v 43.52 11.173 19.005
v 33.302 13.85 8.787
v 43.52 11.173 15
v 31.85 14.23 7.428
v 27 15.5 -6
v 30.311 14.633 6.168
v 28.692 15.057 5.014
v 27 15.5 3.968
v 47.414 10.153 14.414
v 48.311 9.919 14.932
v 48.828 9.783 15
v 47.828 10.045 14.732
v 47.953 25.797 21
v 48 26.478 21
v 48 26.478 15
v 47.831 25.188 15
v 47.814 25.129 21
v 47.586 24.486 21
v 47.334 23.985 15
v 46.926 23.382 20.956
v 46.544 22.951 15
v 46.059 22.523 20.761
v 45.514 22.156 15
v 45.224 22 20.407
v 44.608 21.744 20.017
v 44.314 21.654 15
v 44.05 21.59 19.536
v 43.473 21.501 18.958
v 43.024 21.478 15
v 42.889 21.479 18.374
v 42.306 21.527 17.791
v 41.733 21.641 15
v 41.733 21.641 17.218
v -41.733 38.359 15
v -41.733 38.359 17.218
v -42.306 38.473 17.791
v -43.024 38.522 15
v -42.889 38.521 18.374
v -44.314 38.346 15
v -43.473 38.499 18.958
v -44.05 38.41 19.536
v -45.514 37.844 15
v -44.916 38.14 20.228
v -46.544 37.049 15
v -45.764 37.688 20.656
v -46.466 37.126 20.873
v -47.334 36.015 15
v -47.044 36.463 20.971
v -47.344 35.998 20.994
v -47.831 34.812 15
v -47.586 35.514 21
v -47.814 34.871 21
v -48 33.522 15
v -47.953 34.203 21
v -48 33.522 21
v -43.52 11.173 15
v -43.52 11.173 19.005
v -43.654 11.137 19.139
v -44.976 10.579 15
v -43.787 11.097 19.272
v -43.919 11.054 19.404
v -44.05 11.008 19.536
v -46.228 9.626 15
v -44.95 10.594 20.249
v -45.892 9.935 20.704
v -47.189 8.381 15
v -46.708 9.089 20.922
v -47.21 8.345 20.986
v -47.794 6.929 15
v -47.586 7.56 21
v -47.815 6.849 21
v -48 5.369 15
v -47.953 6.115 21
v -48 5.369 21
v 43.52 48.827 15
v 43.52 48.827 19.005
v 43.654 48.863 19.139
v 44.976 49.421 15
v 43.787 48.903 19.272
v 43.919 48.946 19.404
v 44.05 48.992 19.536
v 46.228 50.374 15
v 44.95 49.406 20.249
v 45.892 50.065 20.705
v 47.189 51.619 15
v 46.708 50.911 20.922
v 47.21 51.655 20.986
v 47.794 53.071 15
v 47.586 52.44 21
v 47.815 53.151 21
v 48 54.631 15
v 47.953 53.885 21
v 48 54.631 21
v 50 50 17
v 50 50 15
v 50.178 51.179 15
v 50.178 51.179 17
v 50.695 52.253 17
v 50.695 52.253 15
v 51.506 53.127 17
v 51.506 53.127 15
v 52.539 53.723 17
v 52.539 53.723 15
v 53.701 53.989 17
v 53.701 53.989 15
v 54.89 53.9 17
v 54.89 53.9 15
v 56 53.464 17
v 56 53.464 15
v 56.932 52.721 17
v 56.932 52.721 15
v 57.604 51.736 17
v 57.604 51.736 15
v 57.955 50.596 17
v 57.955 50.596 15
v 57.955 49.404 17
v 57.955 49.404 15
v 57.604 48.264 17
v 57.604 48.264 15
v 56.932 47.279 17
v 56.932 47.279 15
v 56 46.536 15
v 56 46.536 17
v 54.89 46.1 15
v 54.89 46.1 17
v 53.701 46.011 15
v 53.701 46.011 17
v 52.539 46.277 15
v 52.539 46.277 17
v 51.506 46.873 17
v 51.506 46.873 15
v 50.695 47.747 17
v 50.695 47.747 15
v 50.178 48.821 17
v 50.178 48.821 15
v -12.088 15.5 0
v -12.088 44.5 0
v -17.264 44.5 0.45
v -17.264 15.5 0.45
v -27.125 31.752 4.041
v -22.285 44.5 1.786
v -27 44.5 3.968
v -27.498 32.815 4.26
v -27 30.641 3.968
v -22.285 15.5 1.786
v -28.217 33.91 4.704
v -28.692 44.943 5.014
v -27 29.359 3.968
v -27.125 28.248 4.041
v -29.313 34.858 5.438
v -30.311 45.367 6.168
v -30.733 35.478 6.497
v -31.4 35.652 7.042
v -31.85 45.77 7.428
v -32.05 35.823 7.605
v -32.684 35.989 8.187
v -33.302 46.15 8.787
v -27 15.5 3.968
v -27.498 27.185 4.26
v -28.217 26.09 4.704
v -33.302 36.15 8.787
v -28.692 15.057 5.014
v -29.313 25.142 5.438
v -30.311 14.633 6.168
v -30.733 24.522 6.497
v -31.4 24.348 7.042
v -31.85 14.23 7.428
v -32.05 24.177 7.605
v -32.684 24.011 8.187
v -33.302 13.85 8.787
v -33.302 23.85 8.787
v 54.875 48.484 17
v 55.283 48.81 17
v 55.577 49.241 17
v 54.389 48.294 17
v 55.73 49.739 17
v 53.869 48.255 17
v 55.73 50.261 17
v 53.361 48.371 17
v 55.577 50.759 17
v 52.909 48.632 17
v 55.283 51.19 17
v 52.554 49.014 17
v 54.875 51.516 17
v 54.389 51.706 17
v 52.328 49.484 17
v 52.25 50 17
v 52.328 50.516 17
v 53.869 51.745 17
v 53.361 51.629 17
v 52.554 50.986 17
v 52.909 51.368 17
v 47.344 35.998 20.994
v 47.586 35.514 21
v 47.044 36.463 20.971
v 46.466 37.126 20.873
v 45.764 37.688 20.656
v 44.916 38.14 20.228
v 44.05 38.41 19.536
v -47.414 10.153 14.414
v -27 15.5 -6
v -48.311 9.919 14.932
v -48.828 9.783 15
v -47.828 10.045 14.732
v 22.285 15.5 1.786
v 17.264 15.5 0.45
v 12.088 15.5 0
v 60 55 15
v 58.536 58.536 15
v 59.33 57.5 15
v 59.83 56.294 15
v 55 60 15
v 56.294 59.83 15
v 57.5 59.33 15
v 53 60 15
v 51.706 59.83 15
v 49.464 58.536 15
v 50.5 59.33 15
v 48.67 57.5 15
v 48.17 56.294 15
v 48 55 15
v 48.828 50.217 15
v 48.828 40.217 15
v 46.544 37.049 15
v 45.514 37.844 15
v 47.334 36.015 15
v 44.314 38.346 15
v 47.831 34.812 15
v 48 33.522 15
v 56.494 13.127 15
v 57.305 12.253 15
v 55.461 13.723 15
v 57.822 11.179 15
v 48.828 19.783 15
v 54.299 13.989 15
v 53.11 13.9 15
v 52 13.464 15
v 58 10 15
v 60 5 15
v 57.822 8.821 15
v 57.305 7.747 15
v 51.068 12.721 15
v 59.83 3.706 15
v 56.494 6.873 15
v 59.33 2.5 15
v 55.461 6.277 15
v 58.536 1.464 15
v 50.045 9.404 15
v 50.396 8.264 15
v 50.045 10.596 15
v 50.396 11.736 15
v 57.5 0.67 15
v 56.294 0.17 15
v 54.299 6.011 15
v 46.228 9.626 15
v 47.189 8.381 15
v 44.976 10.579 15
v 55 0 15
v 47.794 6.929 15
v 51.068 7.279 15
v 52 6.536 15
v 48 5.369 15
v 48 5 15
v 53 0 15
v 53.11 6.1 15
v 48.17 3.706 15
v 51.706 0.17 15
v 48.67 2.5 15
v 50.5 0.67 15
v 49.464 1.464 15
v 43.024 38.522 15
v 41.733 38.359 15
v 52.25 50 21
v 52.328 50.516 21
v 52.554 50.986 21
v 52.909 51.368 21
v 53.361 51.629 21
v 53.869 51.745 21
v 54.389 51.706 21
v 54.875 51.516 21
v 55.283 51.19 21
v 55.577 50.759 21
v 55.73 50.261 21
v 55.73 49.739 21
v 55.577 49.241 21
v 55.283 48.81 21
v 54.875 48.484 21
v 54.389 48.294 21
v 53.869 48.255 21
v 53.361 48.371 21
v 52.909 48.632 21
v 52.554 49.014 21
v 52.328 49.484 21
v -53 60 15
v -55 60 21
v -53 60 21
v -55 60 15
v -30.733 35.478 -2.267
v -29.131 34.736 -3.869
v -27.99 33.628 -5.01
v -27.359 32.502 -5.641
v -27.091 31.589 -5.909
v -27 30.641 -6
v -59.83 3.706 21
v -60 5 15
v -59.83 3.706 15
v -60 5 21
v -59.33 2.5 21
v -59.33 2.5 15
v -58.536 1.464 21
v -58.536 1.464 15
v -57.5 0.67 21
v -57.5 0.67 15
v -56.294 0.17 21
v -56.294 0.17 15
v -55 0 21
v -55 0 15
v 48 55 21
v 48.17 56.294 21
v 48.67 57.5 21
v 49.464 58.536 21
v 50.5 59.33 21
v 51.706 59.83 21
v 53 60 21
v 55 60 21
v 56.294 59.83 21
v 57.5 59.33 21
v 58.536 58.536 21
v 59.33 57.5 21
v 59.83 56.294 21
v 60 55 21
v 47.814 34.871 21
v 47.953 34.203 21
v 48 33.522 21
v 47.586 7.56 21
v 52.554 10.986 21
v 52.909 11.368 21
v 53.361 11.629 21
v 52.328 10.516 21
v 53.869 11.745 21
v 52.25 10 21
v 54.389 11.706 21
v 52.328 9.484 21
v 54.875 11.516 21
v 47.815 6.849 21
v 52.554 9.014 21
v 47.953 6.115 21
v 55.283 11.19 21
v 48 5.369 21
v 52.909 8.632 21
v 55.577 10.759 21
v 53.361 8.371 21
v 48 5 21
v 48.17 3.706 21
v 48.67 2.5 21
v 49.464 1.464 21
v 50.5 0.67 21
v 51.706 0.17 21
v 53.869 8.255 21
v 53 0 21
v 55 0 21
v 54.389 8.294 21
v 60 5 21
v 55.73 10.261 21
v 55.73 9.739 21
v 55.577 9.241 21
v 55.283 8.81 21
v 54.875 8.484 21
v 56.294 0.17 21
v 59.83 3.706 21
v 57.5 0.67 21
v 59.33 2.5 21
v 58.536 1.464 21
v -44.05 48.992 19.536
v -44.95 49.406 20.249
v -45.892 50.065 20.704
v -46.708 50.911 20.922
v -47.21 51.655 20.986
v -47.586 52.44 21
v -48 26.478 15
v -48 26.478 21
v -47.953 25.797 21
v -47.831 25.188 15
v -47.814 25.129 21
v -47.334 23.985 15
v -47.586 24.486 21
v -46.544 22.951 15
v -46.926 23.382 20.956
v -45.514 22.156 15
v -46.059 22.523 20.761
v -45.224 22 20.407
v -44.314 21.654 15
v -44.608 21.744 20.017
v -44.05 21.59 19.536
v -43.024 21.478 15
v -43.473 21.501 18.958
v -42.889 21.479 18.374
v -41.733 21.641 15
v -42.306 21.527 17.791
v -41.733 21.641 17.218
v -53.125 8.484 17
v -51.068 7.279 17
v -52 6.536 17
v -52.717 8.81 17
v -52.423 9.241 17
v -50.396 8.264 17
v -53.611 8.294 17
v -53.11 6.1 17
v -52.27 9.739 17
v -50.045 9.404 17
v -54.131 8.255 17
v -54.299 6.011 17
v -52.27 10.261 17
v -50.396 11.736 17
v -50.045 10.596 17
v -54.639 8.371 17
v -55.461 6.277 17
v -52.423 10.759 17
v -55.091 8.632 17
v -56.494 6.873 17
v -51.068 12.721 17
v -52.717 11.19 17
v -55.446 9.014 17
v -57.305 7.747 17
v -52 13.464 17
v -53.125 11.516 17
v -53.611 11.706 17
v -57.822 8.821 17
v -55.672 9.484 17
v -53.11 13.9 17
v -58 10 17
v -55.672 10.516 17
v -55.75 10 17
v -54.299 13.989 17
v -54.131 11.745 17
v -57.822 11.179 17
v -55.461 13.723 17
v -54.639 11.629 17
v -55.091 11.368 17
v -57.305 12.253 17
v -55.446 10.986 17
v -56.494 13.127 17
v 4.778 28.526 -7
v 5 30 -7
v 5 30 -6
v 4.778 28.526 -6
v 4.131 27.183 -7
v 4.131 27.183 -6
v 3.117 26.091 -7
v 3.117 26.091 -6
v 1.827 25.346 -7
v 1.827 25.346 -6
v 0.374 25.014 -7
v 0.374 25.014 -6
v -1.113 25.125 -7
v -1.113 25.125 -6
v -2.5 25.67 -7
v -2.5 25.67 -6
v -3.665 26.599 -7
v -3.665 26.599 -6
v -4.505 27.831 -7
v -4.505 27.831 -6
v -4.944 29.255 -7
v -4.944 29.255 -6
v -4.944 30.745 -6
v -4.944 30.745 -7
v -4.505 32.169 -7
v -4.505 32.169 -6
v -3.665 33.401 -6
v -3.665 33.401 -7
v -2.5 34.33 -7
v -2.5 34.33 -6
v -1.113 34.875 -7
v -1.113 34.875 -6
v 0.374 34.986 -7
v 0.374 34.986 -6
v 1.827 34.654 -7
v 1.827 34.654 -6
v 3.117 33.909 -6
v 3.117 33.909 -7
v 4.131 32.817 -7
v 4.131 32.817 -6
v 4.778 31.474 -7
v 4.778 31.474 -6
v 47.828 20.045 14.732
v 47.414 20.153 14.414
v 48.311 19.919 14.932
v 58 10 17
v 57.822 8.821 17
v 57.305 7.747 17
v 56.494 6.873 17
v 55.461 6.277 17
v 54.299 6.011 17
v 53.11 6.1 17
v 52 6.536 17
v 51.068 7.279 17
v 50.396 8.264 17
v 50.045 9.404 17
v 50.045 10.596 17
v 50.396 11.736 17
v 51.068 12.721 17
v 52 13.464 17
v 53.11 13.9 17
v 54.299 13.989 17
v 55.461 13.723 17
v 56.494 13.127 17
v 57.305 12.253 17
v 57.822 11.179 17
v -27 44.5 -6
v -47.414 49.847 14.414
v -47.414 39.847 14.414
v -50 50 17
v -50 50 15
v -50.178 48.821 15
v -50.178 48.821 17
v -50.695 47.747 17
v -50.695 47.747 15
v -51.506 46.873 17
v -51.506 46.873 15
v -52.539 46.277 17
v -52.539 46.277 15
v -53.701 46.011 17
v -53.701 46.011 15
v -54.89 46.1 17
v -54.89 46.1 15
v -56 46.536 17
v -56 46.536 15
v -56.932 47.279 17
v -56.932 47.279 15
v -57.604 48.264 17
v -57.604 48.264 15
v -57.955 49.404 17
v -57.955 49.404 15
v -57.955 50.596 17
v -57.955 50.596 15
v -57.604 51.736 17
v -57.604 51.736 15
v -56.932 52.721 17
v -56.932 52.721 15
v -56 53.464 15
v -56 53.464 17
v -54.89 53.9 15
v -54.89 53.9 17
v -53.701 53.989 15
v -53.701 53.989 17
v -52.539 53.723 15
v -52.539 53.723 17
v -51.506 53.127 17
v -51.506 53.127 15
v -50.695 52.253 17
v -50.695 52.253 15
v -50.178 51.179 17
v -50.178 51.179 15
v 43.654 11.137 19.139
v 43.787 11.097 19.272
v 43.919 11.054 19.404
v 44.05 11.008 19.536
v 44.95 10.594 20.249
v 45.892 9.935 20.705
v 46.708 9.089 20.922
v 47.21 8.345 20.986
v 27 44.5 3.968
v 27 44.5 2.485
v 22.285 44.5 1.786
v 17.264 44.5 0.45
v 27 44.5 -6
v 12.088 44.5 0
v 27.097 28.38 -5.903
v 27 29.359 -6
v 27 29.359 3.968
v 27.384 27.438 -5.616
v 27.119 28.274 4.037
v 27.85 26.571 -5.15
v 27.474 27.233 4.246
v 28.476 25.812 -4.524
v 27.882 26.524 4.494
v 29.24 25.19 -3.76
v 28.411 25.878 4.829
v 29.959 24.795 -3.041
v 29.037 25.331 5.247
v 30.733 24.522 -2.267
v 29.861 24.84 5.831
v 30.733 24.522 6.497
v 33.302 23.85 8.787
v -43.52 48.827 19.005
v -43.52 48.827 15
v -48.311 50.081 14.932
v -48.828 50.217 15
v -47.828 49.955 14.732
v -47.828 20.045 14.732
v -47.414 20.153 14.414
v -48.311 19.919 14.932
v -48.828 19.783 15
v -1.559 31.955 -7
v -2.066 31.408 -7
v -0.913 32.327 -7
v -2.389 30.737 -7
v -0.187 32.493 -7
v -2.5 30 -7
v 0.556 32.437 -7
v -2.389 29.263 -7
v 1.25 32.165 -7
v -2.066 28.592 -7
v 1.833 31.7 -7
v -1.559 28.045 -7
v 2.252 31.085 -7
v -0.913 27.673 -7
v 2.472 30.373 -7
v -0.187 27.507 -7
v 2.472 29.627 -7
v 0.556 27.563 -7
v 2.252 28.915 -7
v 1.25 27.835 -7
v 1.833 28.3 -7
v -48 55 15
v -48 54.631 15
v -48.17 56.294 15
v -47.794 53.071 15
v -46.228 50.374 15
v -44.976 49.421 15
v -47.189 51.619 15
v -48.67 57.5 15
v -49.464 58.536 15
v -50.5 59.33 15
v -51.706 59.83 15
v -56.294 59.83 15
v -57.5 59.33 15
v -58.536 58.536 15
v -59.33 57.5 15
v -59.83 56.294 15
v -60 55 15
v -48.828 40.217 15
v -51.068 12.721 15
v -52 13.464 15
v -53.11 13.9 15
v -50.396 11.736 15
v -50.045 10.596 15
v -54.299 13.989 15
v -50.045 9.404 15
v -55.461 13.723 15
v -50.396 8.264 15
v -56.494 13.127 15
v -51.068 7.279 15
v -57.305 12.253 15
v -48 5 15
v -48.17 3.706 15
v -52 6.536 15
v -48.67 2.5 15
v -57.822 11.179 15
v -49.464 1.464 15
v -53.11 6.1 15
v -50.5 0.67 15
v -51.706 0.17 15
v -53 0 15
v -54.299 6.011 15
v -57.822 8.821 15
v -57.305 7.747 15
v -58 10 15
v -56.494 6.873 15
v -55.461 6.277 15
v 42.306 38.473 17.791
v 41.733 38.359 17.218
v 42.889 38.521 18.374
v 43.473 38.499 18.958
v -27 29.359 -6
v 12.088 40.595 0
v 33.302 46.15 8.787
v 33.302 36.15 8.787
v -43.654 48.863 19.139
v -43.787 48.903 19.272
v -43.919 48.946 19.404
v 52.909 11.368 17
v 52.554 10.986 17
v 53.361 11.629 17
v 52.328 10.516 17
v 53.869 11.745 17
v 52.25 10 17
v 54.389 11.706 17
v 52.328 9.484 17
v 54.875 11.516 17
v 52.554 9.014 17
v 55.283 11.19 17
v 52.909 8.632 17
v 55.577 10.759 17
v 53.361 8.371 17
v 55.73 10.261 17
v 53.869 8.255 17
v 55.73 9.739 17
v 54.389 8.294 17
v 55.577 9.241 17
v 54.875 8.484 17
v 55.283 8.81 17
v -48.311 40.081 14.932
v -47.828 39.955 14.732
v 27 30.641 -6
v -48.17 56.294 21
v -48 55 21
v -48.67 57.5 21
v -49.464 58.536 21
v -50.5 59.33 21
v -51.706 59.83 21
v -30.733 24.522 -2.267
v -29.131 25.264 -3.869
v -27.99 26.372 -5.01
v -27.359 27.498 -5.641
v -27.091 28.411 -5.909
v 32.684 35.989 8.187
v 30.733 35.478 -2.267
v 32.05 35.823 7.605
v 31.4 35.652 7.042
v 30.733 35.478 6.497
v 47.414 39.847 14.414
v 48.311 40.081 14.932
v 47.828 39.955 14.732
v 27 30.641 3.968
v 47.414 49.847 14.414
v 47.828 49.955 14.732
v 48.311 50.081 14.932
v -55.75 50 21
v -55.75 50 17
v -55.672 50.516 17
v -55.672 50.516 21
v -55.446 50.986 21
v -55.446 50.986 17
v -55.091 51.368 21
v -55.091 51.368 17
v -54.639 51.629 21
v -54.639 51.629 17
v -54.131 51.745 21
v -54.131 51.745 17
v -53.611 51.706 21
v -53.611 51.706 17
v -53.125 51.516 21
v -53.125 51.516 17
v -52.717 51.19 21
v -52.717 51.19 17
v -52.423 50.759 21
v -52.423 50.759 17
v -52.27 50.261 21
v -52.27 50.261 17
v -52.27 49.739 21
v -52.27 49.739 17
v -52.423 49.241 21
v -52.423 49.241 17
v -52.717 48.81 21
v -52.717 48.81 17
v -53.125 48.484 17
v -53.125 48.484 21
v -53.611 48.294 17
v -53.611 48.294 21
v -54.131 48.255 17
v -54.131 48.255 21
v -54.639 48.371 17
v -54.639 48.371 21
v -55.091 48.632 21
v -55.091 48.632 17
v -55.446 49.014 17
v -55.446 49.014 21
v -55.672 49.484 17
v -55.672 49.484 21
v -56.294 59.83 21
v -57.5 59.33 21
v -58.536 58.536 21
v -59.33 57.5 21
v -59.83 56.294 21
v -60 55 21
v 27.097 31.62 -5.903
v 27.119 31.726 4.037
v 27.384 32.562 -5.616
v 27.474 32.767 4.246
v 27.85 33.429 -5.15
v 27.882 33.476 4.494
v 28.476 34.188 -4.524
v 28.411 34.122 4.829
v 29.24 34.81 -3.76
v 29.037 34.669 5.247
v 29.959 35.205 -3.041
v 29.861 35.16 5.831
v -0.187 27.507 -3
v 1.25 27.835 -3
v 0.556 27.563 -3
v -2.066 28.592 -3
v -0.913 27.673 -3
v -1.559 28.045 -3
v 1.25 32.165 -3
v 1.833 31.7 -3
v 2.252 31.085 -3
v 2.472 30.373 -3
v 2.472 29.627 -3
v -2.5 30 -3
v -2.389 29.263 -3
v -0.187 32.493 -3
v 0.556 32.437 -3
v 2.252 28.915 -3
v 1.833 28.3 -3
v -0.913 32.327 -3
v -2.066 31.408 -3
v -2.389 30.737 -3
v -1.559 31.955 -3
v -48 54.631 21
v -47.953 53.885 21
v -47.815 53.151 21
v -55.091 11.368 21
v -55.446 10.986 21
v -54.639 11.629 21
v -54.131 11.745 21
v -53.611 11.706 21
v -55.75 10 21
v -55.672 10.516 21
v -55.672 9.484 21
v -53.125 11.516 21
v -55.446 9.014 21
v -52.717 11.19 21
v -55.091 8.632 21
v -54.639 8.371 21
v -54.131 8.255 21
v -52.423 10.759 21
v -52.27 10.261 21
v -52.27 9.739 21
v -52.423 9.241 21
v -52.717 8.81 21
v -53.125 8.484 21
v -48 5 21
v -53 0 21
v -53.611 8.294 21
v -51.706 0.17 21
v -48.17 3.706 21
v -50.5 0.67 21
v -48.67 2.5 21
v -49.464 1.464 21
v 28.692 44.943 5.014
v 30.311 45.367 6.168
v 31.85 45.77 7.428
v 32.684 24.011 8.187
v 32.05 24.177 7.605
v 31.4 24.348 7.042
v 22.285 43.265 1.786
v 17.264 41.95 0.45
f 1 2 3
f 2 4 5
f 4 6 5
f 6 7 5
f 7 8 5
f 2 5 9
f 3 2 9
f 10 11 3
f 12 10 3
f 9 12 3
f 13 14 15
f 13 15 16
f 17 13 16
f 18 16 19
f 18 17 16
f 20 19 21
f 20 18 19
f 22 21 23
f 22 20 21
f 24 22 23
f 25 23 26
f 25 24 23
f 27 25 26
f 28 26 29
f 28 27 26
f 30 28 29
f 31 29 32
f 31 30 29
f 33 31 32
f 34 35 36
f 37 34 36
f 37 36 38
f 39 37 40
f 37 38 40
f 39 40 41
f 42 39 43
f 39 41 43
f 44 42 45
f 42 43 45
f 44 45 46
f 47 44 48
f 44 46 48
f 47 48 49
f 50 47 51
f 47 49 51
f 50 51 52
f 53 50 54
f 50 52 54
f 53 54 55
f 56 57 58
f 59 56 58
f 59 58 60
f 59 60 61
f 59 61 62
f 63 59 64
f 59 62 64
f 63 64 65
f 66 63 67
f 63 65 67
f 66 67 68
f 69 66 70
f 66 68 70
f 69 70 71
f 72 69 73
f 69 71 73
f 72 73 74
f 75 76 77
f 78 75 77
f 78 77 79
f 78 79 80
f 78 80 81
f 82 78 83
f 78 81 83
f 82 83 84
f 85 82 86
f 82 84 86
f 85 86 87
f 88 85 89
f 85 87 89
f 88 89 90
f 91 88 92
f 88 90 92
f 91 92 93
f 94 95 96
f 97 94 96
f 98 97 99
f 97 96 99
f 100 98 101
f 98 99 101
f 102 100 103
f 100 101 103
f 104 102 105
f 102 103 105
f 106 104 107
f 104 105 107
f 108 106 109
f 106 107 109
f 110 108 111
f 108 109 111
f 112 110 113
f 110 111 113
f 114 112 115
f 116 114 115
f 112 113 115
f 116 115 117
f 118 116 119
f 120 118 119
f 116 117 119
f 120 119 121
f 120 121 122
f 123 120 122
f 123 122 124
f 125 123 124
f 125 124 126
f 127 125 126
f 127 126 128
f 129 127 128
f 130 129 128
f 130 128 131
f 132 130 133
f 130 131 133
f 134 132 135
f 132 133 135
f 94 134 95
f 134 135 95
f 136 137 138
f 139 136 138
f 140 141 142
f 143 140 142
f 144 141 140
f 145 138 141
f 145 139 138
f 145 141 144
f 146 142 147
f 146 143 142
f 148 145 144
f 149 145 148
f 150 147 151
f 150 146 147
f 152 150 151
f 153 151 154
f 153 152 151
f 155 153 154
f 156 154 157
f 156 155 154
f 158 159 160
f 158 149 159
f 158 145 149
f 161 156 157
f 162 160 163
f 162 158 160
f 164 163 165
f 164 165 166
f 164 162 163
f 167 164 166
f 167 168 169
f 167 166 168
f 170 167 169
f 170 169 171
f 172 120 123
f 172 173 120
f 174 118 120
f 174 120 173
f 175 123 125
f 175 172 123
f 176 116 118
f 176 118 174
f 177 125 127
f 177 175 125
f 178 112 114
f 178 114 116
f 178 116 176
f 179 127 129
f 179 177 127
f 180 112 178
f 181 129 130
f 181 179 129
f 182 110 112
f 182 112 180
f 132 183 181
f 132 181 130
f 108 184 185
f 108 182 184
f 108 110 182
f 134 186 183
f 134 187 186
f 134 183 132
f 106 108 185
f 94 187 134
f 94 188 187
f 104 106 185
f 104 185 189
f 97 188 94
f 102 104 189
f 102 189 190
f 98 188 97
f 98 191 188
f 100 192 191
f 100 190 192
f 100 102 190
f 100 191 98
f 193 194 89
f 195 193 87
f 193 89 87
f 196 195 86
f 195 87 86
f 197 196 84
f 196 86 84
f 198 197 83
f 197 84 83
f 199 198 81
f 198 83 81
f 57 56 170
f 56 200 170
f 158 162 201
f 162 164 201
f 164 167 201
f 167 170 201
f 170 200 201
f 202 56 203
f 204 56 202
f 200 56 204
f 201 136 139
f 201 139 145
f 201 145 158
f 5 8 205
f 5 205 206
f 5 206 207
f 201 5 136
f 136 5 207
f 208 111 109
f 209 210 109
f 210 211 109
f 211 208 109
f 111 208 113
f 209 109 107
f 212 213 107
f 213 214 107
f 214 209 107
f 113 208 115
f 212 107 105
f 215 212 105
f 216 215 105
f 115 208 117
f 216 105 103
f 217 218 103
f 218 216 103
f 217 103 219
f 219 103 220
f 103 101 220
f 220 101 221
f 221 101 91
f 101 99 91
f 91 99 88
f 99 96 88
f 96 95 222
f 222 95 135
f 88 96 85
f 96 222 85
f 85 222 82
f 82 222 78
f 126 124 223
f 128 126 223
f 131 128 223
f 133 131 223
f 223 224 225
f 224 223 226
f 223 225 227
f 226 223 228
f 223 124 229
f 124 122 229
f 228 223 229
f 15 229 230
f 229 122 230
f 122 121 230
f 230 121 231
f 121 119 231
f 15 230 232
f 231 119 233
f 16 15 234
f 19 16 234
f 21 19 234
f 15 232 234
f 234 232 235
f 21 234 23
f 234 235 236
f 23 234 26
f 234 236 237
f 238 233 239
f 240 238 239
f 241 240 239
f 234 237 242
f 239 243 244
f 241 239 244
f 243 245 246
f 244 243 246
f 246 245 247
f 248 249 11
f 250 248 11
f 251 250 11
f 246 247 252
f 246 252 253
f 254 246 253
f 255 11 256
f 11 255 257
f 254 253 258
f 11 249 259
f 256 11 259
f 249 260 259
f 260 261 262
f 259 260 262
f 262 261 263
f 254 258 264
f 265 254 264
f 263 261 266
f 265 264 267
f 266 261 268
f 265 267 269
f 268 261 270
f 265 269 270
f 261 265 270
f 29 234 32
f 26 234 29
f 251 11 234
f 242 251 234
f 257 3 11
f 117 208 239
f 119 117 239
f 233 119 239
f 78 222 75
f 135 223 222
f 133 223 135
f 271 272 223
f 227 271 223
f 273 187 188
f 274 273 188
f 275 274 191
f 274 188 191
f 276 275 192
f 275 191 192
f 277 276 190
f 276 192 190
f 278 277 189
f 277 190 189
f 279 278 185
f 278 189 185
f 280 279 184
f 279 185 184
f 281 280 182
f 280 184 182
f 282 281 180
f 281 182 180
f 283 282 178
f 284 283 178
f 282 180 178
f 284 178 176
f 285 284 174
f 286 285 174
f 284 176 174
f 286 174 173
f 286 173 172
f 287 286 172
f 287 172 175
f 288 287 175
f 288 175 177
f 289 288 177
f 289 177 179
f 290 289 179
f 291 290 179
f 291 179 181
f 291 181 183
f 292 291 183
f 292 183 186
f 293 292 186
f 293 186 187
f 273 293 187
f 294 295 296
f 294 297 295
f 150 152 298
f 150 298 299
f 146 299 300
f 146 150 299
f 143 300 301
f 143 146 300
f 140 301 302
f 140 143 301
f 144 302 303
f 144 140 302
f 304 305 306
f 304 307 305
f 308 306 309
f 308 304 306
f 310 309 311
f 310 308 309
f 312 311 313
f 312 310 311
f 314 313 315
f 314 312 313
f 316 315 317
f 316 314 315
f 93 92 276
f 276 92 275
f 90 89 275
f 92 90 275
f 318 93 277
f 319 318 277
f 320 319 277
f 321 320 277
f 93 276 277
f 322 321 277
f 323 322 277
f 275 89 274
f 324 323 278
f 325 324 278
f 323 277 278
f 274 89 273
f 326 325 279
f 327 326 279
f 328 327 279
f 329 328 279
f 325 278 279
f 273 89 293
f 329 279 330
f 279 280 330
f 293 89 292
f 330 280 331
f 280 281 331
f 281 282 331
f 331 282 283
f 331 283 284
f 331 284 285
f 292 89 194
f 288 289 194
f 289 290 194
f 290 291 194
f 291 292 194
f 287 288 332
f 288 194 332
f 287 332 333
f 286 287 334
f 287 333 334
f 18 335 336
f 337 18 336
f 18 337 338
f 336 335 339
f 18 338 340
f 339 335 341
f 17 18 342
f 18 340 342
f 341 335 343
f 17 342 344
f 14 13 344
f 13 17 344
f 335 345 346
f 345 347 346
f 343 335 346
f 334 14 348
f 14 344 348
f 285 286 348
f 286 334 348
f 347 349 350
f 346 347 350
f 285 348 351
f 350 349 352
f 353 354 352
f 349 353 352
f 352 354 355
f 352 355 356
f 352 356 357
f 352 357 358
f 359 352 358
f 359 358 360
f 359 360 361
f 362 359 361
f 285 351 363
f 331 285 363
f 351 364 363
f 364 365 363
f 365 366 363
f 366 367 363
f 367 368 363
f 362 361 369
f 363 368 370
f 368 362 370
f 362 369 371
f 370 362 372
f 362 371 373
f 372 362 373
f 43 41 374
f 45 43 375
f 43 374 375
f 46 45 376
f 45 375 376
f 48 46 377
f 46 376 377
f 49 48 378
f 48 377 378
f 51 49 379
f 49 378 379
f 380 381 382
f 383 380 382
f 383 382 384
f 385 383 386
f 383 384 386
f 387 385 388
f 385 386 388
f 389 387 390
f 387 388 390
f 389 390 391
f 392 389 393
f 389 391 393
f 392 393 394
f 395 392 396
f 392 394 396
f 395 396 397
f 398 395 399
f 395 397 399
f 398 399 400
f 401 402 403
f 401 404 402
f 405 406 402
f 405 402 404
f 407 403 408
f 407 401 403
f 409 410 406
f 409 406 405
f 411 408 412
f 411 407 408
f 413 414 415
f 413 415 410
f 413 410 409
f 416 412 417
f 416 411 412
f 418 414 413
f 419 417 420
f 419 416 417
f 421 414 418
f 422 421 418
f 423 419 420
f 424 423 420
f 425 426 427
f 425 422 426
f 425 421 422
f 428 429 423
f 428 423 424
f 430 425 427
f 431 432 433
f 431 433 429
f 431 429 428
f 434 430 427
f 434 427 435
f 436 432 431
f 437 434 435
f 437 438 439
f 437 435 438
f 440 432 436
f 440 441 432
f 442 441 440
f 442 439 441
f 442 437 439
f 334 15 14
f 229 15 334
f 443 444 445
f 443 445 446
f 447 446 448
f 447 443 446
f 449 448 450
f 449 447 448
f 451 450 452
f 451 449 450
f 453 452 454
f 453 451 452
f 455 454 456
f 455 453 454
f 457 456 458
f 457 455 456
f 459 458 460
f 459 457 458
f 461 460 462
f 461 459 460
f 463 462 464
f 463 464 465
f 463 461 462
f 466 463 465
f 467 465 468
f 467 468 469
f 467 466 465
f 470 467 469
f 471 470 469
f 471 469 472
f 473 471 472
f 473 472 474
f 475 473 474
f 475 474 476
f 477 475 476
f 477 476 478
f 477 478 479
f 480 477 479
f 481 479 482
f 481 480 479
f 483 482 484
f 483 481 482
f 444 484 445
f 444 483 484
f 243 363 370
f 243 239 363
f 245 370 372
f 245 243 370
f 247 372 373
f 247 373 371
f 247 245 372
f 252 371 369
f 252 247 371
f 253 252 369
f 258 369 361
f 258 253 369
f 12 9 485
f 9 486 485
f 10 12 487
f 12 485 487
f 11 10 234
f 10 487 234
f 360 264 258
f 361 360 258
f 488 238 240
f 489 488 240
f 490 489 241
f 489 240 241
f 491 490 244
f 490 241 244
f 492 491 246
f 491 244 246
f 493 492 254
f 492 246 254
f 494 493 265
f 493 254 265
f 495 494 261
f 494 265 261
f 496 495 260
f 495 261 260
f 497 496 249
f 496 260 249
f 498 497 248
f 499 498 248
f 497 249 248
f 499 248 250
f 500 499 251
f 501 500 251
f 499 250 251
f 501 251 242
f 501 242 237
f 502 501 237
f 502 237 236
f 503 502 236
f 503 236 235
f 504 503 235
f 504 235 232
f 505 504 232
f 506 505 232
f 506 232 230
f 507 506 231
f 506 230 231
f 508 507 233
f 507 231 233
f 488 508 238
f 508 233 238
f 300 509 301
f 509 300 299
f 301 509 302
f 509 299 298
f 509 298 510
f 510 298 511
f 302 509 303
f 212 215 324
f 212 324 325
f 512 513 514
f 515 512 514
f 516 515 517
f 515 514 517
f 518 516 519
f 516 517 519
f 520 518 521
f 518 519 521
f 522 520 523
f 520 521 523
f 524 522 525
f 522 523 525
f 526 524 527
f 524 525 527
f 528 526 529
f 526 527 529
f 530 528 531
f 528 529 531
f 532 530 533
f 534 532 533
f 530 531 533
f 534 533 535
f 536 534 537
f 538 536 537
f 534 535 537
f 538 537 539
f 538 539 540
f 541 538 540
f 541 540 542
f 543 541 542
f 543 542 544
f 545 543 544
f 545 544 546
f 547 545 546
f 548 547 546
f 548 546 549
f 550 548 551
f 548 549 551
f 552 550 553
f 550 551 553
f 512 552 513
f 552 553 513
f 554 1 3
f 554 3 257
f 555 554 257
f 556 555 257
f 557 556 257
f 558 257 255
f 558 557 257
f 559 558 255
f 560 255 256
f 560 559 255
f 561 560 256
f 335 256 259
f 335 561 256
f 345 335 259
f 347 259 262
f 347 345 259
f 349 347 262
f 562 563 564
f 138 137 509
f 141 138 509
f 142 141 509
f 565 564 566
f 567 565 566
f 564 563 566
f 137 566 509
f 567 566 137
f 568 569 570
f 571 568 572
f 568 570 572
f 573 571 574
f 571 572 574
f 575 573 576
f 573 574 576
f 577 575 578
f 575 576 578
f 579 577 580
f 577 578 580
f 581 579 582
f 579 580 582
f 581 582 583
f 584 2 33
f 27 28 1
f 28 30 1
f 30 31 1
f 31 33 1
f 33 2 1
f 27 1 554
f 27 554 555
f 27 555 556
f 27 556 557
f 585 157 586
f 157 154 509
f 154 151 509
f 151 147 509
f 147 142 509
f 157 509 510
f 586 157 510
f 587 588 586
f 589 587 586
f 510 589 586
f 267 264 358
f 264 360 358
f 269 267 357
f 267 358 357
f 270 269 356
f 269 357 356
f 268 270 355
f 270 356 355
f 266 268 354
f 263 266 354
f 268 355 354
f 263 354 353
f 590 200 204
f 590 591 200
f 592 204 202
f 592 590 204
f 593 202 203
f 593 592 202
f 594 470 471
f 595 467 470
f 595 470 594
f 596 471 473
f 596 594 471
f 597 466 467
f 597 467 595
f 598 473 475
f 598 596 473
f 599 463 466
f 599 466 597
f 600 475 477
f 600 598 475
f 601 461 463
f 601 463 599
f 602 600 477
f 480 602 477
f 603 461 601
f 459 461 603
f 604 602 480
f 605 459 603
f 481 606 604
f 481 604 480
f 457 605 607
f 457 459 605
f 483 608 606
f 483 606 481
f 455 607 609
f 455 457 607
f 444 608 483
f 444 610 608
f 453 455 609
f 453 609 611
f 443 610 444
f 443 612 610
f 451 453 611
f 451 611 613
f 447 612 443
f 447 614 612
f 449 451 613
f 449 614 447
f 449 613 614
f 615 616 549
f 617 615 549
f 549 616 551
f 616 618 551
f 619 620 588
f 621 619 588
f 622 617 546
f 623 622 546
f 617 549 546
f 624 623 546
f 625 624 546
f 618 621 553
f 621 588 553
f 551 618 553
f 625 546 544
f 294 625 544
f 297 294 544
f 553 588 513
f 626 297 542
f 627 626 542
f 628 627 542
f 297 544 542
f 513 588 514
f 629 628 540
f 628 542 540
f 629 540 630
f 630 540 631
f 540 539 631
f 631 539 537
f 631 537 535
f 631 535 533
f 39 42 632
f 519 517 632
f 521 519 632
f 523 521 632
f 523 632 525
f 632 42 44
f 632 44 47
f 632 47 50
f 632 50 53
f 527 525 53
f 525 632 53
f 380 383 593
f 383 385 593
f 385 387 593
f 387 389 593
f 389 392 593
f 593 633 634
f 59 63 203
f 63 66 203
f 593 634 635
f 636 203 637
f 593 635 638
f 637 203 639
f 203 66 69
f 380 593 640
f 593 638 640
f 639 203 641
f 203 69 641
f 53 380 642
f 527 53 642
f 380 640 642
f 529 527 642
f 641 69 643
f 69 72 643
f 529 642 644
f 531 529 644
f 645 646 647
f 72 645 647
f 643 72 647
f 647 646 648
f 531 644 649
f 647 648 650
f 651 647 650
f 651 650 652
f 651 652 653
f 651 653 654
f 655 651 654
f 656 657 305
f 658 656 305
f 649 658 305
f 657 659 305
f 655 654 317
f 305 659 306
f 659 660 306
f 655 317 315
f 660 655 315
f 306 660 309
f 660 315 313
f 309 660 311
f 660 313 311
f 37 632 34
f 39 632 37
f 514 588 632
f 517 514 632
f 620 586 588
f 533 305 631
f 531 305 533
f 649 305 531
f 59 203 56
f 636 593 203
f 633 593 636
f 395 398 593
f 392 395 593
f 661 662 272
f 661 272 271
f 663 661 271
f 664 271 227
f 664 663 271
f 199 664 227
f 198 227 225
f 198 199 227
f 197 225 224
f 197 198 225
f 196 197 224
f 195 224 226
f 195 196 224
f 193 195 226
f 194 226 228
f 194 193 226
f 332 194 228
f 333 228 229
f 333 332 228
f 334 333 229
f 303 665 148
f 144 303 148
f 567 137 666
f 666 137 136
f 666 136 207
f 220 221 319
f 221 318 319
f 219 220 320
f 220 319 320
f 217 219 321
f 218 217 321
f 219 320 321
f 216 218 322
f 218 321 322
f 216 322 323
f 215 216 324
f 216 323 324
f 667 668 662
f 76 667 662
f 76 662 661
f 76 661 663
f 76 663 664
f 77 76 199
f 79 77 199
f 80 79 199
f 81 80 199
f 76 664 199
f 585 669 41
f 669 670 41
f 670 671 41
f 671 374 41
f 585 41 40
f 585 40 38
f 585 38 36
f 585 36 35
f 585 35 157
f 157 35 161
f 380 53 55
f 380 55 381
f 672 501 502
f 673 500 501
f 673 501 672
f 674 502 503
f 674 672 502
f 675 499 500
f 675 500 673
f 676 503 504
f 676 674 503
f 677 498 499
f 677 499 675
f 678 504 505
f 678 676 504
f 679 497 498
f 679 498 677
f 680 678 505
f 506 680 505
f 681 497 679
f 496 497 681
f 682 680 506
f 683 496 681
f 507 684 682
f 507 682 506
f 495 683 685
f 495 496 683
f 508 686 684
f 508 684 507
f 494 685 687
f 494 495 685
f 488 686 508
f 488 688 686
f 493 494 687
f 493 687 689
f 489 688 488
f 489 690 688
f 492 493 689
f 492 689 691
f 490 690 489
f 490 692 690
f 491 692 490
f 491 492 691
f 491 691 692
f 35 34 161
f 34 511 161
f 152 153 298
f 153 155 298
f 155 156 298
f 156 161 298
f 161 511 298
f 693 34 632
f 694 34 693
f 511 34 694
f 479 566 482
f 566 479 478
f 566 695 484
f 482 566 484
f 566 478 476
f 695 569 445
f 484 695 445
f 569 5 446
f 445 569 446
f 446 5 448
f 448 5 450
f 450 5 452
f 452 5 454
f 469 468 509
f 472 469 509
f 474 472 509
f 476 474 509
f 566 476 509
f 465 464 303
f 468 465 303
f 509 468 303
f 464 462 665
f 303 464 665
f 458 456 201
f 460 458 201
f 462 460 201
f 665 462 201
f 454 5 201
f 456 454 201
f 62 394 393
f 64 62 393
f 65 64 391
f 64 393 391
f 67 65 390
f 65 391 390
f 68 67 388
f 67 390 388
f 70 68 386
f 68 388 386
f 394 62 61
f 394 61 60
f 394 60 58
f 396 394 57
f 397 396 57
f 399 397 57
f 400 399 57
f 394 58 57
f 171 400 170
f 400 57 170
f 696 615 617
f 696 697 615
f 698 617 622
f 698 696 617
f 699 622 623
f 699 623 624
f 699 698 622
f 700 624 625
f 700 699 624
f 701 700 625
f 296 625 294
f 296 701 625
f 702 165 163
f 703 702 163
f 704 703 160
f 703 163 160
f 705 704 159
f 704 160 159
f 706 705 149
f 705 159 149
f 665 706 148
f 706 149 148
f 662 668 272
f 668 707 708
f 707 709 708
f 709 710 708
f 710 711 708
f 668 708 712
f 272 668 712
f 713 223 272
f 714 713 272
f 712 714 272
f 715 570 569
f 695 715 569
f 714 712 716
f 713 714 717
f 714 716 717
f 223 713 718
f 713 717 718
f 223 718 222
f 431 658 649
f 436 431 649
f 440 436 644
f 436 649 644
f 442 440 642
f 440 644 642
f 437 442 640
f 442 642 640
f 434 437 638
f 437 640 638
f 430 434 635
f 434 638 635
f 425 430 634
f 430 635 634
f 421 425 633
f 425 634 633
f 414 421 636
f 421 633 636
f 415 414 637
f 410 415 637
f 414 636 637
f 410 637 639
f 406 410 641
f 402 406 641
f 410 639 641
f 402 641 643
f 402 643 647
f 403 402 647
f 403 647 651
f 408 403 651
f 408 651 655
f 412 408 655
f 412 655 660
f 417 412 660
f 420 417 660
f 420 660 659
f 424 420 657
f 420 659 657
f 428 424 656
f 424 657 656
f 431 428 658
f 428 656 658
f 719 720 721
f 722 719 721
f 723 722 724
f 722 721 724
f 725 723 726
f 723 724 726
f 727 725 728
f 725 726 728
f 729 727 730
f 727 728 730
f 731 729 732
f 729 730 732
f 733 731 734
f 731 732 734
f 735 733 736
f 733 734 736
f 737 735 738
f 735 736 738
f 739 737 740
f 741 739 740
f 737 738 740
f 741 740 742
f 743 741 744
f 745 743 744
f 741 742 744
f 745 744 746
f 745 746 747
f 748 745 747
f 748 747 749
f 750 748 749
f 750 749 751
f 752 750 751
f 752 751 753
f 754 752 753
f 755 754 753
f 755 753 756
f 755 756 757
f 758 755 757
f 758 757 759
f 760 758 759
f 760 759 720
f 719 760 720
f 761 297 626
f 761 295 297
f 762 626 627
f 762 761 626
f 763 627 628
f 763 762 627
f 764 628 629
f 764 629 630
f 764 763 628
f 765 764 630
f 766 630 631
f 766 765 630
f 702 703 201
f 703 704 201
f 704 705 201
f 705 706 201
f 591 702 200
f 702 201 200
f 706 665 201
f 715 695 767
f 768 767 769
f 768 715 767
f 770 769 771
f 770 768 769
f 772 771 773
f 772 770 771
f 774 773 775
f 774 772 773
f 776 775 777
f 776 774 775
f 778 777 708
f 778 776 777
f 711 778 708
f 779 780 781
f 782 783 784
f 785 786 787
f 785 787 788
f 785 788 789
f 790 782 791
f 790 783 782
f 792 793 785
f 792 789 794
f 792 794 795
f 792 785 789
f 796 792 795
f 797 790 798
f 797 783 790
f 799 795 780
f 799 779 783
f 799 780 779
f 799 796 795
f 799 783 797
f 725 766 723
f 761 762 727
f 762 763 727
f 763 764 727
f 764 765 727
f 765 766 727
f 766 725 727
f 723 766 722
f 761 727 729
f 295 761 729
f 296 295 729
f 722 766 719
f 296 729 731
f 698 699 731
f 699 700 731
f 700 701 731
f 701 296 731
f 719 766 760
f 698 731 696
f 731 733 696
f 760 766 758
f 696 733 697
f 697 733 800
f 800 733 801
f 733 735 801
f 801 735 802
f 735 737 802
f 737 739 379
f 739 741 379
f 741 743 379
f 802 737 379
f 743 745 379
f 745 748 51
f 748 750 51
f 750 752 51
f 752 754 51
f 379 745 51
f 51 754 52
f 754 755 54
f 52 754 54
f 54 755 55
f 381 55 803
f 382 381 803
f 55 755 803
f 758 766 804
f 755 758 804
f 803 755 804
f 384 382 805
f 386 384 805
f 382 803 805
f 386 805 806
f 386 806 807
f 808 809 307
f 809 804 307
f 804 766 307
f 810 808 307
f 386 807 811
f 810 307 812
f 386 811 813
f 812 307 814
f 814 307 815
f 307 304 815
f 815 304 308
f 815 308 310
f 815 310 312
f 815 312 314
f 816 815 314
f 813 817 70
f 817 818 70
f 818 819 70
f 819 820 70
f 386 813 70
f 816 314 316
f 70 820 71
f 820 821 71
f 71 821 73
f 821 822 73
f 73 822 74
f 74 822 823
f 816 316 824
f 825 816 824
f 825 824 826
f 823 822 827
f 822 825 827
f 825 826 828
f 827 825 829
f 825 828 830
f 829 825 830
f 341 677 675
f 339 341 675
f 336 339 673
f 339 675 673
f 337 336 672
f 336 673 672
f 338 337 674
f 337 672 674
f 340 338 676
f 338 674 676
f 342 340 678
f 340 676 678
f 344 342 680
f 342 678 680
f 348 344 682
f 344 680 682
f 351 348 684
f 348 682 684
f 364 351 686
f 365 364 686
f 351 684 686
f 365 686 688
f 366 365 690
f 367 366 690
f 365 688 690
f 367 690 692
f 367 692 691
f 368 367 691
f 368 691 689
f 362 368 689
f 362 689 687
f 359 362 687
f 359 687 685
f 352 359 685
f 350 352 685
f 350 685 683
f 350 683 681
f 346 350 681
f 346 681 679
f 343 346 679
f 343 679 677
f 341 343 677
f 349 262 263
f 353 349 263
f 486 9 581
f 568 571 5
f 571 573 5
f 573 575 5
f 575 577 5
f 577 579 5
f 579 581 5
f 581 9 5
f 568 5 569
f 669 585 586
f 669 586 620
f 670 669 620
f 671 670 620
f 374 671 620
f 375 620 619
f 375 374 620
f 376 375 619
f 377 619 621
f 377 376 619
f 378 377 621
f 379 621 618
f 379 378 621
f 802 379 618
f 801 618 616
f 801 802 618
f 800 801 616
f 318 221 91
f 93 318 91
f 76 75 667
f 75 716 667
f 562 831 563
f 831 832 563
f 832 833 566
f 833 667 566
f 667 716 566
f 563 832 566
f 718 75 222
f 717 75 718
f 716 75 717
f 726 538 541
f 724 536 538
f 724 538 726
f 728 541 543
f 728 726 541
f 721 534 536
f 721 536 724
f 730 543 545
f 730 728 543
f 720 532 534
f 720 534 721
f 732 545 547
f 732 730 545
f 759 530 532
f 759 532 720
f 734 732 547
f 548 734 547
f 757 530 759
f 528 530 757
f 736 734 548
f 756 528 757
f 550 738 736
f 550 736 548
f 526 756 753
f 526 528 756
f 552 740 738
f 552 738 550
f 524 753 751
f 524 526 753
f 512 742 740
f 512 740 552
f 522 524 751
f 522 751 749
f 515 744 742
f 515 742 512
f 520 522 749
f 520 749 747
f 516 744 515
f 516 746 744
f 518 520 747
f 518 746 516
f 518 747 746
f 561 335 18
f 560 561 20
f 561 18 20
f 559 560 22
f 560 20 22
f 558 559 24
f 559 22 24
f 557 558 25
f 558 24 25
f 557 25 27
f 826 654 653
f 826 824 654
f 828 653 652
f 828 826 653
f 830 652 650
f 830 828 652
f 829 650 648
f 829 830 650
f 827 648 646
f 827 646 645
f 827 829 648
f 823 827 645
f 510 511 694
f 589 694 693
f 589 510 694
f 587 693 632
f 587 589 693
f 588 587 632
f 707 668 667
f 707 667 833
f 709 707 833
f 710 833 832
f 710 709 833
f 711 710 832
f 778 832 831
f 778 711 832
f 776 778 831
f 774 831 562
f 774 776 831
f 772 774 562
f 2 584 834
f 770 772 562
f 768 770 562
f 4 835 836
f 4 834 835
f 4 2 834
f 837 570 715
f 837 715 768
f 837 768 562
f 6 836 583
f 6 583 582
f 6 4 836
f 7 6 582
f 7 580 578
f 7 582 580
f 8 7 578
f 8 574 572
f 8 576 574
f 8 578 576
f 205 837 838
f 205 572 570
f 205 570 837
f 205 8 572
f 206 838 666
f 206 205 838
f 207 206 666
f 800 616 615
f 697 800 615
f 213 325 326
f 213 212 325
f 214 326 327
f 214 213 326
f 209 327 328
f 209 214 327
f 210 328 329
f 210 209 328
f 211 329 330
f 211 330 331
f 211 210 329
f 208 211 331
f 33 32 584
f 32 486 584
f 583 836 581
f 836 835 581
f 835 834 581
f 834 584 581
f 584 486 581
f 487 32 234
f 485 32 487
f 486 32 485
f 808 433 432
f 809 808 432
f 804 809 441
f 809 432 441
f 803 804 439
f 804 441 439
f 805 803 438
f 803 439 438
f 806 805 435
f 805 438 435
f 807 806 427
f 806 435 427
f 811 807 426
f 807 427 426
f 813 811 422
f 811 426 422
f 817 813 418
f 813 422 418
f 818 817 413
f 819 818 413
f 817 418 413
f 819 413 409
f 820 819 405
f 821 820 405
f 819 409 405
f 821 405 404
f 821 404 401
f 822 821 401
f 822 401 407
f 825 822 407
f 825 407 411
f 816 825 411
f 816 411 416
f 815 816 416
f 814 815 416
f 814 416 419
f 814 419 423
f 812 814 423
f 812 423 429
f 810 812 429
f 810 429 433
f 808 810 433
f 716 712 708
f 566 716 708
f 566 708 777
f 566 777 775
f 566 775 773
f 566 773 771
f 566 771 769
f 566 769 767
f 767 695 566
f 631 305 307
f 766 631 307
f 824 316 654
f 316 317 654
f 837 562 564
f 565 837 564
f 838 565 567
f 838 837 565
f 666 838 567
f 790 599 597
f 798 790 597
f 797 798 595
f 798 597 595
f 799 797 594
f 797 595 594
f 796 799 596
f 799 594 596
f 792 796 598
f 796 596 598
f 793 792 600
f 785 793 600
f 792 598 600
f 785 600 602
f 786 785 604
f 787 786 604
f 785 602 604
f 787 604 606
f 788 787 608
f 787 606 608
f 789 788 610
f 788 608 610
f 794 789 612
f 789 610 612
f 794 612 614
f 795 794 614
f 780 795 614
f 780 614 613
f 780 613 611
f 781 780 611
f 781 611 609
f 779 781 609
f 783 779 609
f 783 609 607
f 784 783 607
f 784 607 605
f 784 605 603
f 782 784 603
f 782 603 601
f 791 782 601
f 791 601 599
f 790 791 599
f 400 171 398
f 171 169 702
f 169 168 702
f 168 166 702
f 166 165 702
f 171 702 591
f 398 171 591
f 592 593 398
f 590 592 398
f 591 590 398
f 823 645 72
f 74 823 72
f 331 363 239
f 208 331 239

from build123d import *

# Parameters (mm, degrees)
EXTRUDE_1_DEPTH     = 60
SKETCH_2_R          = 1.75
CUT_EXTRUDE_1_DEPTH = 40
SKETCH_3_R          = 4
CUT_EXTRUDE_2_DEPTH = 2
SKETCH_4_R          = 2.5
CUT_EXTRUDE_3_DEPTH = 3
EXTRUDE_START       = 1
SKETCH_5_R          = 5
SKETCH_5_R_2        = 2.5
EXTRUDE_2_DEPTH     = 1
FILLET_1_R          = 5
FILLET_2_R          = 30
FILLET_4_R          = 2
FILLET_5_R          = 5
FILLET_6_R          = 6
FILLET_7_R          = 5


with BuildPart() as part:
    # 草图1 → 凸台-拉伸1 (new body)
    with BuildSketch(Plane(origin=(0, 0, 0), x_dir=(1, 0, 0), z_dir=(0, 1, 0))):
        Polygon((-24.514718626, 0), (24.514718626, 0), (45.514718626, -21), (60, -21), (60, -15), (48, -15), (27, 6), (-27, 6), (-48, -15), (-60, -15), (-60, -21), (-45.514718626, -21), align=None)
    extrude(amount=EXTRUDE_1_DEPTH)

    # 草图2 → 切除-拉伸1 (cut)
    with BuildSketch(Plane(origin=(0, 0, -6), x_dir=(-1, 0, 0), z_dir=(0, 0, -1))):
        with Locations((-54, 50)):
            Circle(SKETCH_2_R)
        with Locations((-54, 10)):
            Circle(SKETCH_2_R)
        with Locations((54, 10)):
            Circle(SKETCH_2_R)
        with Locations((54, 50)):
            Circle(SKETCH_2_R)
        Polygon((-48, 60), (-48, 50), (-27, 44.5), (27, 44.5), (48, 50), (48, 60), align=None)
        Polygon((48, 0), (48, 10), (27, 15.5), (-27, 15.5), (-48, 10), (-48, 0), align=None)
        Polygon((-48, 40), (-27, 34.5), (-27, 25.5), (-48, 20), align=None)
        Polygon((48, 20), (27, 25.5), (27, 34.5), (48, 40), align=None)
    extrude(amount=-CUT_EXTRUDE_1_DEPTH, mode=Mode.SUBTRACT)

    # 草图3 → 切除-拉伸2 (cut)
    with BuildSketch(Plane(origin=(0, 0, 15), x_dir=(-1, 0, 0), z_dir=(0, 0, -1))):
        with Locations((-54, 50)):
            Circle(SKETCH_3_R)
        with Locations(Location((-54, 10, 0), (0, 0, 180))):
            Circle(SKETCH_3_R)
        with Locations((54, 10)):
            Circle(SKETCH_3_R)
        with Locations(Location((54, 50, 0), (0, 0, 180))):
            Circle(SKETCH_3_R)
    extrude(amount=-CUT_EXTRUDE_2_DEPTH, mode=Mode.SUBTRACT)

    # 草图4 → 切除-拉伸3 (cut)
    with BuildSketch(Plane(origin=(0, 0, -6), x_dir=(-1, 0, 0), z_dir=(0, 0, -1))):
        with Locations((0, 30)):
            Circle(SKETCH_4_R)
    extrude(amount=-CUT_EXTRUDE_3_DEPTH, mode=Mode.SUBTRACT)

    # 草图5 → 凸台-拉伸2 (add)
    with BuildSketch(Plane(origin=(0, 0, -6), x_dir=(-1, 0, 0), z_dir=(0, 0, -1)).offset(EXTRUDE_START)):
        with Locations(Location((0, 30, 0), (0, 0, 180))):
            Circle(SKETCH_5_R)
        with Locations((0, 30)):
            Circle(SKETCH_5_R_2, mode=Mode.SUBTRACT)
    extrude(amount=-EXTRUDE_2_DEPTH)

    # 圆角1
    fillet_1_edges = [part.edges().sort_by_distance(p)[0] for p in [
        (60, 60, 18),
        (-60, 0, 18),
        (60, 0, 18),
        (-48, 0, 18),
        (48, 0, 18),
        (-60, 60, 18),
        (48, 60, 18),
        (-48, 60, 18),
    ]]
    fillet(fillet_1_edges, radius=FILLET_1_R)

    # 圆角2
    # the kernel refuses this fillet: 30 mm, written as the material it adds along each edge
    with BuildSketch(Plane(origin=(-24.514718626, -15.566017178, 0), x_dir=(-0.7071067811865465, 0, 0.7071067811865487), z_dir=(0, 1, 0))) as fillet_2_piece_1_section:
        with BuildLine():
            CenterArc((FILLET_2_R * 0.414213562373, FILLET_2_R), FILLET_2_R, 225, 45)
            Line((-FILLET_2_R * 0.292893218813, FILLET_2_R * 0.292893218813), (0, 0))
            Line((0, 0), (FILLET_2_R * 0.414213562373, 0))
        make_face()
    fillet_2_piece_1 = extrude(amount=91.132034356, mode=Mode.PRIVATE)
    fillet_2_piece_1 = split(fillet_2_piece_1, bisect_by=Plane(origin=(-29.494529343, 14.846670886, 5.3692292), z_dir=(-0.25335939183768474, 0.967372223380245, 0)), keep=Keep.TOP, mode=Mode.PRIVATE)
    fillet_2_piece_1 = split(fillet_2_piece_1, bisect_by=Plane(origin=(-31.945457725, 24.204761072, 5.3692292), z_dir=(0.2533593918376857, -0.9673722233802448, 0)), keep=Keep.TOP, mode=Mode.PRIVATE)
    add(fillet_2_piece_1)
    with BuildSketch(Plane(origin=(-24.514718626, 15.5, 0), x_dir=(-0.7071067811865465, 0, 0.7071067811865487), z_dir=(0, 1, 0))) as fillet_2_piece_2_section:
        with BuildLine():
            CenterArc((FILLET_2_R * 0.414213562373, FILLET_2_R), FILLET_2_R, 225, 45)
            Line((-FILLET_2_R * 0.292893218813, FILLET_2_R * 0.292893218813), (0, 0))
            Line((0, 0), (FILLET_2_R * 0.414213562373, 0))
        make_face()
    fillet_2_piece_2 = extrude(amount=29, mode=Mode.PRIVATE)
    fillet_2_piece_2 = split(fillet_2_piece_2, bisect_by=Plane(origin=(-27, 16.298150863, 0.780837191), z_dir=(1, 0, 0)), keep=Keep.TOP, mode=Mode.PRIVATE)
    add(fillet_2_piece_2)
    with BuildSketch(Plane(origin=(-24.514718626, -15.566017178, 0), x_dir=(-0.7071067811865465, 0, 0.7071067811865487), z_dir=(0, 1, 0))) as fillet_2_piece_3_section:
        with BuildLine():
            CenterArc((FILLET_2_R * 0.414213562373, FILLET_2_R), FILLET_2_R, 225, 45)
            Line((-FILLET_2_R * 0.292893218813, FILLET_2_R * 0.292893218813), (0, 0))
            Line((0, 0), (FILLET_2_R * 0.414213562373, 0))
        make_face()
    fillet_2_piece_3 = extrude(amount=91.132034356, mode=Mode.PRIVATE)
    fillet_2_piece_3 = split(fillet_2_piece_3, bisect_by=Plane(origin=(-29.759175244, 35.222641135, 4.528426502), z_dir=(0.25335939183768585, 0.9673722233802448, 0)), keep=Keep.TOP, mode=Mode.PRIVATE)
    fillet_2_piece_3 = split(fillet_2_piece_3, bisect_by=Plane(origin=(-27.308246862, 44.580731321, 4.528426502), z_dir=(-0.2533593918376847, -0.967372223380245, 0)), keep=Keep.TOP, mode=Mode.PRIVATE)
    add(fillet_2_piece_3)
    with BuildSketch(Plane(origin=(24.514718626, -15.566017178, 0), x_dir=(0.7071067811865461, 0, 0.7071067811865488), z_dir=(0, 1, 0))) as fillet_2_piece_4_section:
        with BuildLine():
            CenterArc((FILLET_2_R * 0.414213562373, -FILLET_2_R), FILLET_2_R, 90, 45)
            Line((-FILLET_2_R * 0.292893218813, -FILLET_2_R * 0.292893218813), (0, 0))
            Line((0, 0), (FILLET_2_R * 0.414213562373, 0))
        make_face()
    fillet_2_piece_4 = extrude(amount=91.132034356, mode=Mode.PRIVATE)
    fillet_2_piece_4 = split(fillet_2_piece_4, bisect_by=Plane(origin=(29.494529343, 14.846670886, 5.3692292), z_dir=(0.25335939183768474, 0.967372223380245, 0)), keep=Keep.TOP, mode=Mode.PRIVATE)
    fillet_2_piece_4 = split(fillet_2_piece_4, bisect_by=Plane(origin=(31.945457725, 24.204761072, 5.3692292), z_dir=(-0.25335939183768474, -0.967372223380245, 0)), keep=Keep.TOP, mode=Mode.PRIVATE)
    add(fillet_2_piece_4)
    with BuildSketch(Plane(origin=(24.514718626, 15.5, 0), x_dir=(0.7071067811865461, 0, 0.7071067811865488), z_dir=(0, 1, 0))) as fillet_2_piece_5_section:
        with BuildLine():
            CenterArc((FILLET_2_R * 0.414213562373, -FILLET_2_R), FILLET_2_R, 90, 45)
            Line((-FILLET_2_R * 0.292893218813, -FILLET_2_R * 0.292893218813), (0, 0))
            Line((0, 0), (FILLET_2_R * 0.414213562373, 0))
        make_face()
    fillet_2_piece_5 = extrude(amount=60.066017178, mode=Mode.PRIVATE)
    fillet_2_piece_5 = split(fillet_2_piece_5, bisect_by=Plane(origin=(27, 16.298150863, 0.780837191), z_dir=(-1, 0, 0)), keep=Keep.TOP, mode=Mode.PRIVATE)
    fillet_2_piece_5 = split(fillet_2_piece_5, bisect_by=Plane(origin=(14.384200648, 41.195862074, 0.780837191), z_dir=(0.2533593918376847, -0.967372223380245, 0)), keep=Keep.TOP, mode=Mode.PRIVATE)
    add(fillet_2_piece_5)
    with BuildSketch(Plane(origin=(24.514718626, -15.566017178, 0), x_dir=(0.7071067811865461, 0, 0.7071067811865488), z_dir=(0, 1, 0))) as fillet_2_piece_6_section:
        with BuildLine():
            CenterArc((FILLET_2_R * 0.414213562373, -FILLET_2_R), FILLET_2_R, 90, 45)
            Line((-FILLET_2_R * 0.292893218813, -FILLET_2_R * 0.292893218813), (0, 0))
            Line((0, 0), (FILLET_2_R * 0.414213562373, 0))
        make_face()
    fillet_2_piece_6 = extrude(amount=91.132034356, mode=Mode.PRIVATE)
    fillet_2_piece_6 = split(fillet_2_piece_6, bisect_by=Plane(origin=(29.759175244, 35.222641135, 4.528426502), z_dir=(-0.2533593918376849, 0.967372223380245, 0)), keep=Keep.TOP, mode=Mode.PRIVATE)
    fillet_2_piece_6 = split(fillet_2_piece_6, bisect_by=Plane(origin=(27.308246862, 44.580731321, 4.528426502), z_dir=(0.2533593918376847, -0.967372223380245, 0)), keep=Keep.TOP, mode=Mode.PRIVATE)
    add(fillet_2_piece_6)
    with BuildSketch(Plane(origin=(24.514718626, -15.566017178, 0), x_dir=(0.7071067811865461, 0, 0.7071067811865488), z_dir=(0, 1, 0))) as fillet_2_piece_7_section:
        with BuildLine():
            CenterArc((FILLET_2_R * 0.414213562373, -FILLET_2_R), FILLET_2_R, 90, 45)
            Line((-FILLET_2_R * 0.292893218813, -FILLET_2_R * 0.292893218813), (0, 0))
            Line((0, 0), (FILLET_2_R * 0.414213562373, 0))
        make_face()
    fillet_2_piece_7 = extrude(amount=60.066017178, mode=Mode.PRIVATE)
    fillet_2_piece_7 = split(fillet_2_piece_7, bisect_by=Plane(origin=(21.100650835, 42.954932361, 0.780837191), z_dir=(-0.2533593918376847, 0.967372223380245, 0)), keep=Keep.TOP, mode=Mode.PRIVATE)
    add(fillet_2_piece_7)

    # 圆角4
    fillet_4_edges = [part.edges().sort_by_distance(p)[0] for p in [
        (-48, 45, 15),
        (-48, 15, 15),
        (48, 45, 15),
        (48, 15, 15),
    ]]
    fillet(fillet_4_edges, radius=FILLET_4_R)

    # 圆角5
    fillet_5_edges = [part.edges().sort_by_distance(p)[0] for p in [
        (-45.514718626, 44.349092973, 21),
        (-45.514718626, 15.650907027, 21),
        (45.514718626, 44.349092973, 21),
        (45.514718626, 15.650907027, 21),
    ]]
    fillet(fillet_5_edges, radius=FILLET_5_R)

    # 圆角6
    fillet_6_edges = [part.edges().sort_by_distance(p)[0] for p in [
        (48, 50, 18),
        (-48, 50, 18),
        (-48, 10, 18),
        (48, 10, 18),
    ]]
    fillet(fillet_6_edges, radius=FILLET_6_R)

    # 圆角7
    fillet_7_edges = [part.edges().sort_by_distance(p)[0] for p in [
        (-48, 20, 18),
        (-48, 40, 18),
        (48, 40, 18),
        (48, 20, 18),
        (27, 25.5, -1.015774599),
        (27, 34.5, -1.015774599),
        (-27, 25.5, -1.015774599),
        (-27, 34.5, -1.015774599),
    ]]
    fillet(fillet_7_edges, radius=FILLET_7_R)


solid = part.part
